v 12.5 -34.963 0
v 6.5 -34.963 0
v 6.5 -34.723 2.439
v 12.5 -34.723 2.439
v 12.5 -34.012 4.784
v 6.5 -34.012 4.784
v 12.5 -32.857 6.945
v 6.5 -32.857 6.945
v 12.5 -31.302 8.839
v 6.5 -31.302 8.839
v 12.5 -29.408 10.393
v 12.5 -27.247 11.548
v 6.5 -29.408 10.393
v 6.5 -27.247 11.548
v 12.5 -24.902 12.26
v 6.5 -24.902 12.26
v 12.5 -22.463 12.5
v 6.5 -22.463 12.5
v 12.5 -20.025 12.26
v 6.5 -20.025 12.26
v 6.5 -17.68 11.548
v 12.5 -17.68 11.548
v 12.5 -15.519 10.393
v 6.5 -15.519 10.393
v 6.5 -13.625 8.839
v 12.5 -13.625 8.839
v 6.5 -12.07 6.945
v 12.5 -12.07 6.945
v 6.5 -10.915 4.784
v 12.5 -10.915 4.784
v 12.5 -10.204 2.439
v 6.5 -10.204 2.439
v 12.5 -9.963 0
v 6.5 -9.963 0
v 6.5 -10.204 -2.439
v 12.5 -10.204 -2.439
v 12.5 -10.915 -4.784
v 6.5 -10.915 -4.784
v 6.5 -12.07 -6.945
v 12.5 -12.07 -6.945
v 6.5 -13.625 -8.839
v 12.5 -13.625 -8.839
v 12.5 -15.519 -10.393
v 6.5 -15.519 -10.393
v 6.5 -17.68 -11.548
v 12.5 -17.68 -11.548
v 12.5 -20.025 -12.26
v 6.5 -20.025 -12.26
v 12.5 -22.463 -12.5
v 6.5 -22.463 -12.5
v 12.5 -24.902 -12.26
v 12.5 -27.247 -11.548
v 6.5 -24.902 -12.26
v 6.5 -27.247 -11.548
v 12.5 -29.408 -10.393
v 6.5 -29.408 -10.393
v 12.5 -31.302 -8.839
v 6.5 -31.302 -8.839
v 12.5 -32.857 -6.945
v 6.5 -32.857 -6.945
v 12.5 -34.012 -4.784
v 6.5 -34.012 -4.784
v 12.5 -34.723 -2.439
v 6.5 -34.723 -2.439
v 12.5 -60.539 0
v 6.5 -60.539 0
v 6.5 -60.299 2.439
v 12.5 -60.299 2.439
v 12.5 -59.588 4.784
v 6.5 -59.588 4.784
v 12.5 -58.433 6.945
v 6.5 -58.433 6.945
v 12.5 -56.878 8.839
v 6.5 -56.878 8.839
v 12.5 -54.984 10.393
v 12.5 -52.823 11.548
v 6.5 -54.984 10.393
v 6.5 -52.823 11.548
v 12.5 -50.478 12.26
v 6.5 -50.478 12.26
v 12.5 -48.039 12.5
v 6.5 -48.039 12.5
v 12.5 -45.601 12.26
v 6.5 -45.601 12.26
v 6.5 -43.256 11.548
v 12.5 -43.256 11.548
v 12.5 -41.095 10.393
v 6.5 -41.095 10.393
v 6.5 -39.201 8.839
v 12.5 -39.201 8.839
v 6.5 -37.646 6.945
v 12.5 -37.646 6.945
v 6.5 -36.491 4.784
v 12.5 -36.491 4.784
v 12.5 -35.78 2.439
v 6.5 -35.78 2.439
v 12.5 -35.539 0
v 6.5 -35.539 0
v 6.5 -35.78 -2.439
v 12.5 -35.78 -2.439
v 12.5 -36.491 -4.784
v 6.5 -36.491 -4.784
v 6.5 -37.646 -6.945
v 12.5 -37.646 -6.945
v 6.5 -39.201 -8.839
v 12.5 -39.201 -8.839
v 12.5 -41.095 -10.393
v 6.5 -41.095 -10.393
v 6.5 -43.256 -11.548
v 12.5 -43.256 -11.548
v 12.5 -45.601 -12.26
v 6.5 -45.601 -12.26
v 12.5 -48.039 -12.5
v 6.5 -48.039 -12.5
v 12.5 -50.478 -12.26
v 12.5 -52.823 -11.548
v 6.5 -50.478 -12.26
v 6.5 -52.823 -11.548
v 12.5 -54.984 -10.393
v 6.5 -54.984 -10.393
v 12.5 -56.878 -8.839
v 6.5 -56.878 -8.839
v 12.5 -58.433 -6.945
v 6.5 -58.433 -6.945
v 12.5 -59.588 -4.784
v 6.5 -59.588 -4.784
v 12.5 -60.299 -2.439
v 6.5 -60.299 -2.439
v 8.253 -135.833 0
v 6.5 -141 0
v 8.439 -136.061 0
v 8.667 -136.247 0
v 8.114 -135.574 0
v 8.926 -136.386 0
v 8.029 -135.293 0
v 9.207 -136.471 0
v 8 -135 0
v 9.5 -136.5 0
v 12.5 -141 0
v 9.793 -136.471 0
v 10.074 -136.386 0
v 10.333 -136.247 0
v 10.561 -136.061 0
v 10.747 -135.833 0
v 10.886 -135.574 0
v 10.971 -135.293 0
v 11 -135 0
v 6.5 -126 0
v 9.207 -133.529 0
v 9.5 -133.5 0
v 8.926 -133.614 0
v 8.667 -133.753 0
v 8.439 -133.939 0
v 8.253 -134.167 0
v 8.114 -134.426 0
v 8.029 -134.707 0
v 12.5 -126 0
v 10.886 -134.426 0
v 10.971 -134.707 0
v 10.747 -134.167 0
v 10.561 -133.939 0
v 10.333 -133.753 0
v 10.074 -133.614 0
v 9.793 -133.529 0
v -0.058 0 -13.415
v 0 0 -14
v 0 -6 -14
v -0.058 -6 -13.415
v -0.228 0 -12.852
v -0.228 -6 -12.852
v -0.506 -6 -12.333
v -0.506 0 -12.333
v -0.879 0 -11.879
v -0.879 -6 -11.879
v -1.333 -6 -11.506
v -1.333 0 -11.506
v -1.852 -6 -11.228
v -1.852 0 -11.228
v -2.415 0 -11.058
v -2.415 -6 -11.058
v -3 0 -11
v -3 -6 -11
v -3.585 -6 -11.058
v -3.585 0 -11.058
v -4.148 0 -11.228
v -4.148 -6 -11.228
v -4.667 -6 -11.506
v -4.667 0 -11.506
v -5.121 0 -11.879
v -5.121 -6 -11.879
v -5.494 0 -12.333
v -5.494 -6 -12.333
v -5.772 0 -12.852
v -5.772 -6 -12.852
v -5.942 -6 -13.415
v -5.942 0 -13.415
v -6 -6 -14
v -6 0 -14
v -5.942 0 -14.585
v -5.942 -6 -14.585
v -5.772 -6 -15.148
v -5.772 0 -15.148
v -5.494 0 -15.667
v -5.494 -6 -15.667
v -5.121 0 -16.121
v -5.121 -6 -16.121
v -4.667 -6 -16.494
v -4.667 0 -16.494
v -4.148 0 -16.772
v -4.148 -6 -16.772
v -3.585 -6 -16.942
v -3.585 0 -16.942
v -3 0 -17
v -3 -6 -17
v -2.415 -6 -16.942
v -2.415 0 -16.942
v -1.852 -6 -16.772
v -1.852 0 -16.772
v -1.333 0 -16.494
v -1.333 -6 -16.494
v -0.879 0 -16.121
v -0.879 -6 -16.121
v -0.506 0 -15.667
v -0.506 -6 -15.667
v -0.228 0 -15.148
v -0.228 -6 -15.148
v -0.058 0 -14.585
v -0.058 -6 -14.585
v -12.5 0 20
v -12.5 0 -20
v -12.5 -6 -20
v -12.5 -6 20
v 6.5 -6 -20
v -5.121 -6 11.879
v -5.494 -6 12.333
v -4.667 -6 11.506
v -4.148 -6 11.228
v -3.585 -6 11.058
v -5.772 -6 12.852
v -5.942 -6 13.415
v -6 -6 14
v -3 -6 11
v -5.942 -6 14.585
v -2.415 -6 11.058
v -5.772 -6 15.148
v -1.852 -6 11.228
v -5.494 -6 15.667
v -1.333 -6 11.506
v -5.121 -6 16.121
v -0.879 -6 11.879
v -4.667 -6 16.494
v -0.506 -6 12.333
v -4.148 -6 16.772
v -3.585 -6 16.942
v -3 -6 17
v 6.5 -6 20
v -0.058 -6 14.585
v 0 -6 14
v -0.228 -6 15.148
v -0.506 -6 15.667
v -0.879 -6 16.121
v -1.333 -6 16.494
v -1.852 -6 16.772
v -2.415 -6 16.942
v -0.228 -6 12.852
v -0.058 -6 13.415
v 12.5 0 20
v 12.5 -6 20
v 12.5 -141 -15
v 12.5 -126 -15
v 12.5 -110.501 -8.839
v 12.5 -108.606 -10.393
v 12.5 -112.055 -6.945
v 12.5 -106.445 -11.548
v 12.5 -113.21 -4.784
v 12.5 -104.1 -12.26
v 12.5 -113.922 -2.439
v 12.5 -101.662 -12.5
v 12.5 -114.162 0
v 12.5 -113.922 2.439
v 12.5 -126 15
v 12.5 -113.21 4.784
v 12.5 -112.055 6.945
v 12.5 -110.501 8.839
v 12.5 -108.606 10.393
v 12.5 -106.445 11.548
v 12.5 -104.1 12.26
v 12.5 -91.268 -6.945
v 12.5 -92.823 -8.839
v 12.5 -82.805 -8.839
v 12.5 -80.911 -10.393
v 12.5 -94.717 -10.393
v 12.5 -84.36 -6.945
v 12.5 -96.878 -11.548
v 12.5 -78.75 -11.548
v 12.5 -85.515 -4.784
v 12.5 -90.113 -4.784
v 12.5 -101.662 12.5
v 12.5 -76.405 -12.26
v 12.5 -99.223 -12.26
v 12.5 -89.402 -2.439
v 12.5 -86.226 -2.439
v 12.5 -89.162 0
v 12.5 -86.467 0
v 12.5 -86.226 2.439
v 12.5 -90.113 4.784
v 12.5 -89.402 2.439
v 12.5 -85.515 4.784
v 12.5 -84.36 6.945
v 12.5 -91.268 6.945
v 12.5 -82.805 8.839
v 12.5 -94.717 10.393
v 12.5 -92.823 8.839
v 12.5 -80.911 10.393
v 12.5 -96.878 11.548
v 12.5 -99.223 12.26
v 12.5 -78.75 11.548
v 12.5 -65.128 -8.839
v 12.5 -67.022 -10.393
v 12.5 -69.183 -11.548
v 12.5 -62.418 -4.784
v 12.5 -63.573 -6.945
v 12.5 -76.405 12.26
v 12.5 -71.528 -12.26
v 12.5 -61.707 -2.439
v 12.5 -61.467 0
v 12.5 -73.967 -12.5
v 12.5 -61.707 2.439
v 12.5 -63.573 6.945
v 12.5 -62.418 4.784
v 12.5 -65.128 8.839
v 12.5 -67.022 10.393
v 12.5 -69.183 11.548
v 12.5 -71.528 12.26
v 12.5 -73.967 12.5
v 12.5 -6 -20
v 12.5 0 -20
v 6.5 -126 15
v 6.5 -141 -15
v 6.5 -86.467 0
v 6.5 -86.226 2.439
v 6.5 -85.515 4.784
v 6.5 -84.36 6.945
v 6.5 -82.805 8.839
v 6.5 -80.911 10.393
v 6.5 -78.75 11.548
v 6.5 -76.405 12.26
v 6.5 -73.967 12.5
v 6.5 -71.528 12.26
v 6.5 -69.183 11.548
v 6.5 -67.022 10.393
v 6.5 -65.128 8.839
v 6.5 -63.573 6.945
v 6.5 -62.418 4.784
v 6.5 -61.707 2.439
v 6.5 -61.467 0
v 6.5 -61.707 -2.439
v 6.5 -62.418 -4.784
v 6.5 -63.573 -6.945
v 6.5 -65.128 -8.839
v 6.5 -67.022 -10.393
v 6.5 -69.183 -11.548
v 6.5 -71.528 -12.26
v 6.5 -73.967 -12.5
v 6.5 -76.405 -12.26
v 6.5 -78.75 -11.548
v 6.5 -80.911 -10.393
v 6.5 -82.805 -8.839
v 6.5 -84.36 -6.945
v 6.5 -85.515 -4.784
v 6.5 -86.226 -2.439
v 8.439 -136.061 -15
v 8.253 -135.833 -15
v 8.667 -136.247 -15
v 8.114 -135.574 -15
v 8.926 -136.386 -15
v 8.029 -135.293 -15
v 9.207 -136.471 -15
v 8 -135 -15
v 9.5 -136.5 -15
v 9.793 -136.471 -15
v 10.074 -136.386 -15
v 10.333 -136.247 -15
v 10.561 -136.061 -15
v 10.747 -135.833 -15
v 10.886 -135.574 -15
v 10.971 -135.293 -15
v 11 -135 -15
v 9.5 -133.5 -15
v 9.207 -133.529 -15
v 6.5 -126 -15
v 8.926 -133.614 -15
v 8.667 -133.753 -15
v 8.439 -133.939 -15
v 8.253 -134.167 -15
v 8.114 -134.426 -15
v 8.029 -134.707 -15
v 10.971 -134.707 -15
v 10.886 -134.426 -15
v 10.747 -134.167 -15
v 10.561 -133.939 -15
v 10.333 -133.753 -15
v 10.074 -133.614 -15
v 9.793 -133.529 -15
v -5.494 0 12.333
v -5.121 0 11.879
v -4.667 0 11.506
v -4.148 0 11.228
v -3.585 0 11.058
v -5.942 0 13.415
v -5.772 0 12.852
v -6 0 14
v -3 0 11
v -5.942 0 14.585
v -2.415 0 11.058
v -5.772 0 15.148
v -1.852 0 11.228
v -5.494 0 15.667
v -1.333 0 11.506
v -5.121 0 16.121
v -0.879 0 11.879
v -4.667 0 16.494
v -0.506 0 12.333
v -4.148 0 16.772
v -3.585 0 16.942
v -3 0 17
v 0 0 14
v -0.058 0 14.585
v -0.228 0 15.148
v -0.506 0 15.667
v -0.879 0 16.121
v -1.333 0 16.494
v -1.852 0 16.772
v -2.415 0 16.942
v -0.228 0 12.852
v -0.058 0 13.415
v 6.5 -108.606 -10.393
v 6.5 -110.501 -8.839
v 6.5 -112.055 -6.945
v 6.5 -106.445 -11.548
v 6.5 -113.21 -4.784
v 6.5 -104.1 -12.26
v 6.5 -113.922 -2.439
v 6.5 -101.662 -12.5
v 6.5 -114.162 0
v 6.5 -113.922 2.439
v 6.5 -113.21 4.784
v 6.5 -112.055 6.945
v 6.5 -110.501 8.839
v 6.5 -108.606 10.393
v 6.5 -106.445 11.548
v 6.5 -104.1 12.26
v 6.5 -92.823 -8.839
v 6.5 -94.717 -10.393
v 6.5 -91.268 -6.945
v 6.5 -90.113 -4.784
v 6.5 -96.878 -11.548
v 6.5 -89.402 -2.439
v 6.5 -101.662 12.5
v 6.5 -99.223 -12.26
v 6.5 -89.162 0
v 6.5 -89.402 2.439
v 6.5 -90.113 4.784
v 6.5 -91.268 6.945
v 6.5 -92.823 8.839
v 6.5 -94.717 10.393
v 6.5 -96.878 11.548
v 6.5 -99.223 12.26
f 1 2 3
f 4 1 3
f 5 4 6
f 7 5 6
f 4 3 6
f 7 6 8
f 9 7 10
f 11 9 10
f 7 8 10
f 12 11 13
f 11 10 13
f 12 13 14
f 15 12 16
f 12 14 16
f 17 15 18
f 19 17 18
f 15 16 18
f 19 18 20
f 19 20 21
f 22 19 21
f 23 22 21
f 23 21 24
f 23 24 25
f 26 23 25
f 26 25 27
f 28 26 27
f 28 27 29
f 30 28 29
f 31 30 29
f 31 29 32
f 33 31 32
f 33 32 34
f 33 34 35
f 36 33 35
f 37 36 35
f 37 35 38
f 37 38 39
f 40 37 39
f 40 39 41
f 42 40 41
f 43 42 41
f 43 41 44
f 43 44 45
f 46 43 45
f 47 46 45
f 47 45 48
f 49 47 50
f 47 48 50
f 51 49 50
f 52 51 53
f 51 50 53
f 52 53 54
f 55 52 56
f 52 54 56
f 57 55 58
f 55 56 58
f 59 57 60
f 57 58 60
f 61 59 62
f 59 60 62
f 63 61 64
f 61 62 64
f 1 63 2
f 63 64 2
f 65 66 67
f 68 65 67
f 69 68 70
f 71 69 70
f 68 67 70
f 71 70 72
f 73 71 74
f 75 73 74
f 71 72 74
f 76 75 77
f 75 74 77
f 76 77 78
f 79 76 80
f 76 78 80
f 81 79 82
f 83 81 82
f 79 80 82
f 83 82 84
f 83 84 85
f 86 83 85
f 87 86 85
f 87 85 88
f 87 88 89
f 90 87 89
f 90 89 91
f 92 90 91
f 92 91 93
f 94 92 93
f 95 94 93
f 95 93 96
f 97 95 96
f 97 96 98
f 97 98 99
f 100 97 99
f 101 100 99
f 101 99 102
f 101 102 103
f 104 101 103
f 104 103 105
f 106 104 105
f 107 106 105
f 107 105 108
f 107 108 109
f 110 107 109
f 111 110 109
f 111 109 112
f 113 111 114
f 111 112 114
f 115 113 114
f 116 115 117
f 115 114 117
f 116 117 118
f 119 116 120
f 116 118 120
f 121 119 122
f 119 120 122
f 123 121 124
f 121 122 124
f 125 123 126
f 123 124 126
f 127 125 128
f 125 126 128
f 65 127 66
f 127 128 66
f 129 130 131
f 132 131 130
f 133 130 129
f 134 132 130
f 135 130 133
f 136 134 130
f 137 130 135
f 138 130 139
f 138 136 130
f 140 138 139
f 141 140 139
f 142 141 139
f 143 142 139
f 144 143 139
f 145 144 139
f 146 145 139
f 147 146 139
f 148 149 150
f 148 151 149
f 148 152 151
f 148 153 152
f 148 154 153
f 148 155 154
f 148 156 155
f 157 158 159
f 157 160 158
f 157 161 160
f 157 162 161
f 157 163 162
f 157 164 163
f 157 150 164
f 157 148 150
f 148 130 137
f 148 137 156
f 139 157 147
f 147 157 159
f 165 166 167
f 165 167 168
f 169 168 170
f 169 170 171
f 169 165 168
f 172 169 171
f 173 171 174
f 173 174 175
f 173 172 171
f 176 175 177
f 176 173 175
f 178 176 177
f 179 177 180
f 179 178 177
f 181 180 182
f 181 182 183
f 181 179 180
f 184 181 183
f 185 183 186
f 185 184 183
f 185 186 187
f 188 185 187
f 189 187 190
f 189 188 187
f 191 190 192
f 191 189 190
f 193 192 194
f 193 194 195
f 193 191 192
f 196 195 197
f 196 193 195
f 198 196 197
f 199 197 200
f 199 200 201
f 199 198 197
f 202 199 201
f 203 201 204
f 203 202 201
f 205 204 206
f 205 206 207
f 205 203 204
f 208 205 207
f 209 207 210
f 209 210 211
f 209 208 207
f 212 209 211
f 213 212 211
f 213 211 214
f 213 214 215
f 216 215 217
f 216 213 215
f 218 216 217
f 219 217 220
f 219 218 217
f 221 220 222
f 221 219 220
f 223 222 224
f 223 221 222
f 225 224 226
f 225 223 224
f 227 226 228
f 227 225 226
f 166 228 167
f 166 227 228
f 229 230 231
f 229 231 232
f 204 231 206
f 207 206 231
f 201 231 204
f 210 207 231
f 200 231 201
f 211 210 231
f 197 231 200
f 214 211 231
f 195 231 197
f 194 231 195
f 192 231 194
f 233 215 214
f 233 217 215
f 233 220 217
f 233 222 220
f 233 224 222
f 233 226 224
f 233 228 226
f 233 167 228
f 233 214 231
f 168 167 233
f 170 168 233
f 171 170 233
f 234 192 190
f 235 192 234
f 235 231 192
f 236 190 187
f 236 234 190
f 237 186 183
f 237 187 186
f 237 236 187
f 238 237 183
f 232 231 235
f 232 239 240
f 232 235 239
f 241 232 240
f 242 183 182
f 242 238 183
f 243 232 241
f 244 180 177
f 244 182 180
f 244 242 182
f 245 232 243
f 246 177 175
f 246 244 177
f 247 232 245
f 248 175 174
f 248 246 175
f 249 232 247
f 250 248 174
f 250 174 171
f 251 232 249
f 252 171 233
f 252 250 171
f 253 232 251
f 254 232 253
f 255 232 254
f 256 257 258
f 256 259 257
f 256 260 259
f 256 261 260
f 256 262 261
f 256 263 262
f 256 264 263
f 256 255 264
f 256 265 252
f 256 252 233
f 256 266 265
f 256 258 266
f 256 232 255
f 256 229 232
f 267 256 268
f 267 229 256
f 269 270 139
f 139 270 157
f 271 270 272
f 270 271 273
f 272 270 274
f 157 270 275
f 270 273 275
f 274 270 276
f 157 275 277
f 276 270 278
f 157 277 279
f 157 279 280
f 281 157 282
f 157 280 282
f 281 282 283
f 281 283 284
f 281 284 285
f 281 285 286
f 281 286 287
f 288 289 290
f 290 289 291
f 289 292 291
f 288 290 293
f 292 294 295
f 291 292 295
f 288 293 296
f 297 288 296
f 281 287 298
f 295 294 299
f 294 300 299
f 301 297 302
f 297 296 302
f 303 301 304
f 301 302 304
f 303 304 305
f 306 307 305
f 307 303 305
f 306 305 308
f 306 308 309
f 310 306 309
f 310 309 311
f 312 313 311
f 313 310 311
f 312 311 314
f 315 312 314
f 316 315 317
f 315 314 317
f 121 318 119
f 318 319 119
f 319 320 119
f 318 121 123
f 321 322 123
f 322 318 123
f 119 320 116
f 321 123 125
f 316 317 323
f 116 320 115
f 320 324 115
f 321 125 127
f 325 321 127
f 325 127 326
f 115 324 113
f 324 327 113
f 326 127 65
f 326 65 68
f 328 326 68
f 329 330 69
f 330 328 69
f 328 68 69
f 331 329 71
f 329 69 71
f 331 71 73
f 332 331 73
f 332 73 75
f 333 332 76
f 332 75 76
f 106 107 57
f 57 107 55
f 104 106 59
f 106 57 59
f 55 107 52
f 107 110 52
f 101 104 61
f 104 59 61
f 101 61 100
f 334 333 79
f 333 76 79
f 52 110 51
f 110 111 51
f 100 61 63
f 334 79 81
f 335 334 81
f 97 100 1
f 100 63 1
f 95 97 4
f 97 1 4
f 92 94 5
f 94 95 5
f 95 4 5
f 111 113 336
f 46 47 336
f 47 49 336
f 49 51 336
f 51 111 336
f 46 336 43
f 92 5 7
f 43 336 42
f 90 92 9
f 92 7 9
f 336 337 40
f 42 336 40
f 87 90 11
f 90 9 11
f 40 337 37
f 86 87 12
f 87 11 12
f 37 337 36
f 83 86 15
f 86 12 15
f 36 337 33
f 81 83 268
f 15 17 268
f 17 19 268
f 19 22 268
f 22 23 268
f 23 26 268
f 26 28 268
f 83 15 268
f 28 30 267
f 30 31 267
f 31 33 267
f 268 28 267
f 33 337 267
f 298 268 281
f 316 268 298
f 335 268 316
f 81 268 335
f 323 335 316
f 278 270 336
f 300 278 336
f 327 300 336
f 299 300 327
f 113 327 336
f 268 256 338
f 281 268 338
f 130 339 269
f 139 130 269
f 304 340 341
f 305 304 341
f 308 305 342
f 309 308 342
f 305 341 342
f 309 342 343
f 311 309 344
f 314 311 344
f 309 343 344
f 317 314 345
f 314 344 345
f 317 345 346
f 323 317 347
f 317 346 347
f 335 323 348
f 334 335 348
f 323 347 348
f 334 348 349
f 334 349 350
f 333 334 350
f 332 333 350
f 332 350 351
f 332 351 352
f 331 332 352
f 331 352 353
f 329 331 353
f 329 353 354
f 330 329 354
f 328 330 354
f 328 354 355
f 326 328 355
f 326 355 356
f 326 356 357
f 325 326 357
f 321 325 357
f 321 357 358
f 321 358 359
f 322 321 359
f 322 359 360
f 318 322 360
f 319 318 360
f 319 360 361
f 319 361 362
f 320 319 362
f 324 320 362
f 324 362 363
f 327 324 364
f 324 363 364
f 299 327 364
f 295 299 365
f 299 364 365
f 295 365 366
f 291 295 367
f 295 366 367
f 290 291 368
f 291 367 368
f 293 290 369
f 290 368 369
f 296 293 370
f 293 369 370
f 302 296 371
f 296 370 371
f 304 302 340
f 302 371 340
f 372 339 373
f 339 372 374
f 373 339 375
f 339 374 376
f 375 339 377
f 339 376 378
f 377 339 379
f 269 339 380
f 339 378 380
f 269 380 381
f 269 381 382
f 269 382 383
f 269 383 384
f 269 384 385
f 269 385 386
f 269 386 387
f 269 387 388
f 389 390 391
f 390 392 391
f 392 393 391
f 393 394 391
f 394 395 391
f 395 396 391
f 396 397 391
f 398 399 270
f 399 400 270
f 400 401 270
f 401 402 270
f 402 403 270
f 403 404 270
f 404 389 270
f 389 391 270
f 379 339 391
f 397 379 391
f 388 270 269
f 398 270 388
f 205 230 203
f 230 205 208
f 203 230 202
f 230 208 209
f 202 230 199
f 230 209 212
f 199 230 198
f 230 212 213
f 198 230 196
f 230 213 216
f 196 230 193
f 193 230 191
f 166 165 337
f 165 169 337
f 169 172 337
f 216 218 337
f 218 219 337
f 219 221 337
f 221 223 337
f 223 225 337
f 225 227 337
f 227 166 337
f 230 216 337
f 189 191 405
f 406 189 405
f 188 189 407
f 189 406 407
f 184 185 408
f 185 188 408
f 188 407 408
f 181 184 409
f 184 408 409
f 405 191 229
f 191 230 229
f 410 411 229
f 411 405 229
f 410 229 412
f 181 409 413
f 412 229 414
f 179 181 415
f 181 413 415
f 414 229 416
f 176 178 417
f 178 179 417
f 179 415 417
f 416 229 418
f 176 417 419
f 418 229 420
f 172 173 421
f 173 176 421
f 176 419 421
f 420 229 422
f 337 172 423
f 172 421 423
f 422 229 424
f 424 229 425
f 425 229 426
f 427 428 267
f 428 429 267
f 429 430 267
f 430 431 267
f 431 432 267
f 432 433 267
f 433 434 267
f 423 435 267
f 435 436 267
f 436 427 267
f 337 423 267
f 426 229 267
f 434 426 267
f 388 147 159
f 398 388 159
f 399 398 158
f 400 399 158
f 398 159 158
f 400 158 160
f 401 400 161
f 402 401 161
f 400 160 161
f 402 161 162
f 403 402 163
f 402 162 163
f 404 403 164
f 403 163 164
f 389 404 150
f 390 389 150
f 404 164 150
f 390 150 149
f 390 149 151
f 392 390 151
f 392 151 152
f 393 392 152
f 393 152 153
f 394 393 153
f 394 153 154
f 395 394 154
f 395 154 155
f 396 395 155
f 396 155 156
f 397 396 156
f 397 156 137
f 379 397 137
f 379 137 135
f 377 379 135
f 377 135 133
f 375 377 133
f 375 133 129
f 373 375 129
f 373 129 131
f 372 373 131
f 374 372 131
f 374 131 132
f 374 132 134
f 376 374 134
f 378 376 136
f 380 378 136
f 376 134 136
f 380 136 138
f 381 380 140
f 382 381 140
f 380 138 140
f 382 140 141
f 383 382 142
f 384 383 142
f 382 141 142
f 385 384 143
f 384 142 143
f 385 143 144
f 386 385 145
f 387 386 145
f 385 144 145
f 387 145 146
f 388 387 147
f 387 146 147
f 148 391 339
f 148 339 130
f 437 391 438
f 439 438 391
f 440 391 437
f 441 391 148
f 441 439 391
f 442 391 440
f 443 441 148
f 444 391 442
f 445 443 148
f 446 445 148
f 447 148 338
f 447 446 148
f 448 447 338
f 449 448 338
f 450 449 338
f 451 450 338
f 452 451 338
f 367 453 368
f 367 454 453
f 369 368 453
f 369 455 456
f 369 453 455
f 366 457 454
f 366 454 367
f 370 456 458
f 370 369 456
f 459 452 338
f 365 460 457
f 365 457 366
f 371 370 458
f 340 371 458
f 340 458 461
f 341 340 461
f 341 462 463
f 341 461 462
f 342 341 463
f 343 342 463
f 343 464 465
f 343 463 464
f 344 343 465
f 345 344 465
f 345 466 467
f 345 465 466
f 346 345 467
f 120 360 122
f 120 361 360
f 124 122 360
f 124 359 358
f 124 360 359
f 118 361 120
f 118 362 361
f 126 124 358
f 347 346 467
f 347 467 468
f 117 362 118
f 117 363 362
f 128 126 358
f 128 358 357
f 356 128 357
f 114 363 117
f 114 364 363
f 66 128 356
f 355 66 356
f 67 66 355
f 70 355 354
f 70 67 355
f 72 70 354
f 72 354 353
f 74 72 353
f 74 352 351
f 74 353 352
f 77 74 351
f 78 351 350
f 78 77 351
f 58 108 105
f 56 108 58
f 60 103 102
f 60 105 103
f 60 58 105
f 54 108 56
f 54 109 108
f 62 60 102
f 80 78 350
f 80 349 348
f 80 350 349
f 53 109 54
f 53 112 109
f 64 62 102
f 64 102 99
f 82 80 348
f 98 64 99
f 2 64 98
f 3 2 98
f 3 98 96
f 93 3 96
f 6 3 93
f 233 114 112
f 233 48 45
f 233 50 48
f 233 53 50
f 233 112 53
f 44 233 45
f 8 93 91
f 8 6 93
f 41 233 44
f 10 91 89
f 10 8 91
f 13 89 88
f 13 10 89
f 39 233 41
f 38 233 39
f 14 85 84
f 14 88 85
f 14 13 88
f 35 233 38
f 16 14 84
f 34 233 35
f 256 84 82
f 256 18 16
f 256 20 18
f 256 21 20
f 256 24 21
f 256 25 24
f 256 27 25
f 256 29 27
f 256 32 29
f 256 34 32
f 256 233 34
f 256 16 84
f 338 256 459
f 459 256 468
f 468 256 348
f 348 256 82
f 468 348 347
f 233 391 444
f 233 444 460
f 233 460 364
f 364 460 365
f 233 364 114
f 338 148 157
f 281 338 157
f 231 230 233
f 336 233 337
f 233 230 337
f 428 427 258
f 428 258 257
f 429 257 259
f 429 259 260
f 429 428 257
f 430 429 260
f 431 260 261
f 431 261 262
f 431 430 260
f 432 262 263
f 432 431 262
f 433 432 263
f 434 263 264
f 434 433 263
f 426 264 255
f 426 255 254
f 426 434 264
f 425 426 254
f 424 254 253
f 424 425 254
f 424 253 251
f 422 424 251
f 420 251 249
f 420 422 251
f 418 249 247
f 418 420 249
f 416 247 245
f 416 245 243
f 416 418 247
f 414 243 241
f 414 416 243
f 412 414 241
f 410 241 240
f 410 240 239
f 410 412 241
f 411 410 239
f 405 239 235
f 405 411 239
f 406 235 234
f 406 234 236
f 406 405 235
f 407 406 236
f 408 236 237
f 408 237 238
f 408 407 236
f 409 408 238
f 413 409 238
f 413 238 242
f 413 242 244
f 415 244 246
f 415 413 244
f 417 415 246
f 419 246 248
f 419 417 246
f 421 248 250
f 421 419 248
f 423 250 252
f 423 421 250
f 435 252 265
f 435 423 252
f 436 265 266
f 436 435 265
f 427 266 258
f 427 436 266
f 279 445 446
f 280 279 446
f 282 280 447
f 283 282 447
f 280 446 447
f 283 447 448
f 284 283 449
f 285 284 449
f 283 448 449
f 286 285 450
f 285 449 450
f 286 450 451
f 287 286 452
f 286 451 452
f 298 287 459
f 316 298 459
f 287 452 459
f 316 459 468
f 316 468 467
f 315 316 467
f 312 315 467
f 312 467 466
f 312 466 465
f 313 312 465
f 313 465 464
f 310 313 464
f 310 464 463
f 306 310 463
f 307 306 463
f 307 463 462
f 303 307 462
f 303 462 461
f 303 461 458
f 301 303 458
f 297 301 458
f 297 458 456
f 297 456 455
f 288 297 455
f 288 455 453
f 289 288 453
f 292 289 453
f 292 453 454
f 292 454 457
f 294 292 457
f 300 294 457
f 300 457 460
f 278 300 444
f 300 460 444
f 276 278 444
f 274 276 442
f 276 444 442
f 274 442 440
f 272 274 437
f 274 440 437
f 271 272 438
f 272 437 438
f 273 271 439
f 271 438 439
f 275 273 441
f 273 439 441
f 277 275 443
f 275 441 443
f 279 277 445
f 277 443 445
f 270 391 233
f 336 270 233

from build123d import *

# Parameters (mm, degrees)
F0_W     = 25
F0_H     = 40
F0_R     = 3
F1_DEPTH = 6
F2_W     = 6
F2_H     = 40
F3_DEPTH = 120
F4_R     = 12.5
F5_DEPTH = 25.4
F6_W     = 6
F6_H     = 15
F7_DEPTH = 15
F8_R     = 1.5
F9_DEPTH = 20.001


with BuildPart() as f1:
    # F0 (on Front) → F1 (new body)
    with BuildSketch(Plane.XZ):
        Rectangle(F0_W, F0_H)
        with Locations((-3, -14)):
            Circle(F0_R, mode=Mode.SUBTRACT)
        with Locations((-3, 14)):
            Circle(F0_R, mode=Mode.SUBTRACT)
    extrude(amount=F1_DEPTH)

    # F2 (on face) → F3 (join)
    with BuildSketch(Plane.XZ.offset(6)):
        with Locations((9.5, 0)):
            Rectangle(F2_W, F2_H)
    extrude(amount=F3_DEPTH)

    # F4 (on face) → F5 (cut)
    with BuildSketch(Plane(origin=(6.5, 0, 0), x_dir=(0, -1, 0), z_dir=(-1, 0, 0))):
        Polygon((126, 20), (6, 20), (126, 15), align=None)
        Polygon((126, -15), (6, -20), (126, -20), align=None)
        with Locations((101.661727, 0)):
            Circle(F4_R)
        with Locations((73.966578, 0)):
            Circle(F4_R)
        with Locations((48.03938, 0)):
            Circle(F4_R)
        with Locations((22.46337, 0)):
            Circle(F4_R)
    extrude(amount=-F5_DEPTH, mode=Mode.SUBTRACT)

    # F6 (on face) → F7 (join)
    with BuildSketch(Plane.XZ.offset(126)):
        with Locations((9.5, -7.5)):
            Rectangle(F6_W, F6_H)
    extrude(amount=F7_DEPTH)

    # F8 (on face) → F9 (cut, through all)
    with BuildSketch(Plane.XY):
        with Locations((9.5, -135)):
            Circle(F8_R)
    extrude(amount=-F9_DEPTH, mode=Mode.SUBTRACT)


solid = f1.part
